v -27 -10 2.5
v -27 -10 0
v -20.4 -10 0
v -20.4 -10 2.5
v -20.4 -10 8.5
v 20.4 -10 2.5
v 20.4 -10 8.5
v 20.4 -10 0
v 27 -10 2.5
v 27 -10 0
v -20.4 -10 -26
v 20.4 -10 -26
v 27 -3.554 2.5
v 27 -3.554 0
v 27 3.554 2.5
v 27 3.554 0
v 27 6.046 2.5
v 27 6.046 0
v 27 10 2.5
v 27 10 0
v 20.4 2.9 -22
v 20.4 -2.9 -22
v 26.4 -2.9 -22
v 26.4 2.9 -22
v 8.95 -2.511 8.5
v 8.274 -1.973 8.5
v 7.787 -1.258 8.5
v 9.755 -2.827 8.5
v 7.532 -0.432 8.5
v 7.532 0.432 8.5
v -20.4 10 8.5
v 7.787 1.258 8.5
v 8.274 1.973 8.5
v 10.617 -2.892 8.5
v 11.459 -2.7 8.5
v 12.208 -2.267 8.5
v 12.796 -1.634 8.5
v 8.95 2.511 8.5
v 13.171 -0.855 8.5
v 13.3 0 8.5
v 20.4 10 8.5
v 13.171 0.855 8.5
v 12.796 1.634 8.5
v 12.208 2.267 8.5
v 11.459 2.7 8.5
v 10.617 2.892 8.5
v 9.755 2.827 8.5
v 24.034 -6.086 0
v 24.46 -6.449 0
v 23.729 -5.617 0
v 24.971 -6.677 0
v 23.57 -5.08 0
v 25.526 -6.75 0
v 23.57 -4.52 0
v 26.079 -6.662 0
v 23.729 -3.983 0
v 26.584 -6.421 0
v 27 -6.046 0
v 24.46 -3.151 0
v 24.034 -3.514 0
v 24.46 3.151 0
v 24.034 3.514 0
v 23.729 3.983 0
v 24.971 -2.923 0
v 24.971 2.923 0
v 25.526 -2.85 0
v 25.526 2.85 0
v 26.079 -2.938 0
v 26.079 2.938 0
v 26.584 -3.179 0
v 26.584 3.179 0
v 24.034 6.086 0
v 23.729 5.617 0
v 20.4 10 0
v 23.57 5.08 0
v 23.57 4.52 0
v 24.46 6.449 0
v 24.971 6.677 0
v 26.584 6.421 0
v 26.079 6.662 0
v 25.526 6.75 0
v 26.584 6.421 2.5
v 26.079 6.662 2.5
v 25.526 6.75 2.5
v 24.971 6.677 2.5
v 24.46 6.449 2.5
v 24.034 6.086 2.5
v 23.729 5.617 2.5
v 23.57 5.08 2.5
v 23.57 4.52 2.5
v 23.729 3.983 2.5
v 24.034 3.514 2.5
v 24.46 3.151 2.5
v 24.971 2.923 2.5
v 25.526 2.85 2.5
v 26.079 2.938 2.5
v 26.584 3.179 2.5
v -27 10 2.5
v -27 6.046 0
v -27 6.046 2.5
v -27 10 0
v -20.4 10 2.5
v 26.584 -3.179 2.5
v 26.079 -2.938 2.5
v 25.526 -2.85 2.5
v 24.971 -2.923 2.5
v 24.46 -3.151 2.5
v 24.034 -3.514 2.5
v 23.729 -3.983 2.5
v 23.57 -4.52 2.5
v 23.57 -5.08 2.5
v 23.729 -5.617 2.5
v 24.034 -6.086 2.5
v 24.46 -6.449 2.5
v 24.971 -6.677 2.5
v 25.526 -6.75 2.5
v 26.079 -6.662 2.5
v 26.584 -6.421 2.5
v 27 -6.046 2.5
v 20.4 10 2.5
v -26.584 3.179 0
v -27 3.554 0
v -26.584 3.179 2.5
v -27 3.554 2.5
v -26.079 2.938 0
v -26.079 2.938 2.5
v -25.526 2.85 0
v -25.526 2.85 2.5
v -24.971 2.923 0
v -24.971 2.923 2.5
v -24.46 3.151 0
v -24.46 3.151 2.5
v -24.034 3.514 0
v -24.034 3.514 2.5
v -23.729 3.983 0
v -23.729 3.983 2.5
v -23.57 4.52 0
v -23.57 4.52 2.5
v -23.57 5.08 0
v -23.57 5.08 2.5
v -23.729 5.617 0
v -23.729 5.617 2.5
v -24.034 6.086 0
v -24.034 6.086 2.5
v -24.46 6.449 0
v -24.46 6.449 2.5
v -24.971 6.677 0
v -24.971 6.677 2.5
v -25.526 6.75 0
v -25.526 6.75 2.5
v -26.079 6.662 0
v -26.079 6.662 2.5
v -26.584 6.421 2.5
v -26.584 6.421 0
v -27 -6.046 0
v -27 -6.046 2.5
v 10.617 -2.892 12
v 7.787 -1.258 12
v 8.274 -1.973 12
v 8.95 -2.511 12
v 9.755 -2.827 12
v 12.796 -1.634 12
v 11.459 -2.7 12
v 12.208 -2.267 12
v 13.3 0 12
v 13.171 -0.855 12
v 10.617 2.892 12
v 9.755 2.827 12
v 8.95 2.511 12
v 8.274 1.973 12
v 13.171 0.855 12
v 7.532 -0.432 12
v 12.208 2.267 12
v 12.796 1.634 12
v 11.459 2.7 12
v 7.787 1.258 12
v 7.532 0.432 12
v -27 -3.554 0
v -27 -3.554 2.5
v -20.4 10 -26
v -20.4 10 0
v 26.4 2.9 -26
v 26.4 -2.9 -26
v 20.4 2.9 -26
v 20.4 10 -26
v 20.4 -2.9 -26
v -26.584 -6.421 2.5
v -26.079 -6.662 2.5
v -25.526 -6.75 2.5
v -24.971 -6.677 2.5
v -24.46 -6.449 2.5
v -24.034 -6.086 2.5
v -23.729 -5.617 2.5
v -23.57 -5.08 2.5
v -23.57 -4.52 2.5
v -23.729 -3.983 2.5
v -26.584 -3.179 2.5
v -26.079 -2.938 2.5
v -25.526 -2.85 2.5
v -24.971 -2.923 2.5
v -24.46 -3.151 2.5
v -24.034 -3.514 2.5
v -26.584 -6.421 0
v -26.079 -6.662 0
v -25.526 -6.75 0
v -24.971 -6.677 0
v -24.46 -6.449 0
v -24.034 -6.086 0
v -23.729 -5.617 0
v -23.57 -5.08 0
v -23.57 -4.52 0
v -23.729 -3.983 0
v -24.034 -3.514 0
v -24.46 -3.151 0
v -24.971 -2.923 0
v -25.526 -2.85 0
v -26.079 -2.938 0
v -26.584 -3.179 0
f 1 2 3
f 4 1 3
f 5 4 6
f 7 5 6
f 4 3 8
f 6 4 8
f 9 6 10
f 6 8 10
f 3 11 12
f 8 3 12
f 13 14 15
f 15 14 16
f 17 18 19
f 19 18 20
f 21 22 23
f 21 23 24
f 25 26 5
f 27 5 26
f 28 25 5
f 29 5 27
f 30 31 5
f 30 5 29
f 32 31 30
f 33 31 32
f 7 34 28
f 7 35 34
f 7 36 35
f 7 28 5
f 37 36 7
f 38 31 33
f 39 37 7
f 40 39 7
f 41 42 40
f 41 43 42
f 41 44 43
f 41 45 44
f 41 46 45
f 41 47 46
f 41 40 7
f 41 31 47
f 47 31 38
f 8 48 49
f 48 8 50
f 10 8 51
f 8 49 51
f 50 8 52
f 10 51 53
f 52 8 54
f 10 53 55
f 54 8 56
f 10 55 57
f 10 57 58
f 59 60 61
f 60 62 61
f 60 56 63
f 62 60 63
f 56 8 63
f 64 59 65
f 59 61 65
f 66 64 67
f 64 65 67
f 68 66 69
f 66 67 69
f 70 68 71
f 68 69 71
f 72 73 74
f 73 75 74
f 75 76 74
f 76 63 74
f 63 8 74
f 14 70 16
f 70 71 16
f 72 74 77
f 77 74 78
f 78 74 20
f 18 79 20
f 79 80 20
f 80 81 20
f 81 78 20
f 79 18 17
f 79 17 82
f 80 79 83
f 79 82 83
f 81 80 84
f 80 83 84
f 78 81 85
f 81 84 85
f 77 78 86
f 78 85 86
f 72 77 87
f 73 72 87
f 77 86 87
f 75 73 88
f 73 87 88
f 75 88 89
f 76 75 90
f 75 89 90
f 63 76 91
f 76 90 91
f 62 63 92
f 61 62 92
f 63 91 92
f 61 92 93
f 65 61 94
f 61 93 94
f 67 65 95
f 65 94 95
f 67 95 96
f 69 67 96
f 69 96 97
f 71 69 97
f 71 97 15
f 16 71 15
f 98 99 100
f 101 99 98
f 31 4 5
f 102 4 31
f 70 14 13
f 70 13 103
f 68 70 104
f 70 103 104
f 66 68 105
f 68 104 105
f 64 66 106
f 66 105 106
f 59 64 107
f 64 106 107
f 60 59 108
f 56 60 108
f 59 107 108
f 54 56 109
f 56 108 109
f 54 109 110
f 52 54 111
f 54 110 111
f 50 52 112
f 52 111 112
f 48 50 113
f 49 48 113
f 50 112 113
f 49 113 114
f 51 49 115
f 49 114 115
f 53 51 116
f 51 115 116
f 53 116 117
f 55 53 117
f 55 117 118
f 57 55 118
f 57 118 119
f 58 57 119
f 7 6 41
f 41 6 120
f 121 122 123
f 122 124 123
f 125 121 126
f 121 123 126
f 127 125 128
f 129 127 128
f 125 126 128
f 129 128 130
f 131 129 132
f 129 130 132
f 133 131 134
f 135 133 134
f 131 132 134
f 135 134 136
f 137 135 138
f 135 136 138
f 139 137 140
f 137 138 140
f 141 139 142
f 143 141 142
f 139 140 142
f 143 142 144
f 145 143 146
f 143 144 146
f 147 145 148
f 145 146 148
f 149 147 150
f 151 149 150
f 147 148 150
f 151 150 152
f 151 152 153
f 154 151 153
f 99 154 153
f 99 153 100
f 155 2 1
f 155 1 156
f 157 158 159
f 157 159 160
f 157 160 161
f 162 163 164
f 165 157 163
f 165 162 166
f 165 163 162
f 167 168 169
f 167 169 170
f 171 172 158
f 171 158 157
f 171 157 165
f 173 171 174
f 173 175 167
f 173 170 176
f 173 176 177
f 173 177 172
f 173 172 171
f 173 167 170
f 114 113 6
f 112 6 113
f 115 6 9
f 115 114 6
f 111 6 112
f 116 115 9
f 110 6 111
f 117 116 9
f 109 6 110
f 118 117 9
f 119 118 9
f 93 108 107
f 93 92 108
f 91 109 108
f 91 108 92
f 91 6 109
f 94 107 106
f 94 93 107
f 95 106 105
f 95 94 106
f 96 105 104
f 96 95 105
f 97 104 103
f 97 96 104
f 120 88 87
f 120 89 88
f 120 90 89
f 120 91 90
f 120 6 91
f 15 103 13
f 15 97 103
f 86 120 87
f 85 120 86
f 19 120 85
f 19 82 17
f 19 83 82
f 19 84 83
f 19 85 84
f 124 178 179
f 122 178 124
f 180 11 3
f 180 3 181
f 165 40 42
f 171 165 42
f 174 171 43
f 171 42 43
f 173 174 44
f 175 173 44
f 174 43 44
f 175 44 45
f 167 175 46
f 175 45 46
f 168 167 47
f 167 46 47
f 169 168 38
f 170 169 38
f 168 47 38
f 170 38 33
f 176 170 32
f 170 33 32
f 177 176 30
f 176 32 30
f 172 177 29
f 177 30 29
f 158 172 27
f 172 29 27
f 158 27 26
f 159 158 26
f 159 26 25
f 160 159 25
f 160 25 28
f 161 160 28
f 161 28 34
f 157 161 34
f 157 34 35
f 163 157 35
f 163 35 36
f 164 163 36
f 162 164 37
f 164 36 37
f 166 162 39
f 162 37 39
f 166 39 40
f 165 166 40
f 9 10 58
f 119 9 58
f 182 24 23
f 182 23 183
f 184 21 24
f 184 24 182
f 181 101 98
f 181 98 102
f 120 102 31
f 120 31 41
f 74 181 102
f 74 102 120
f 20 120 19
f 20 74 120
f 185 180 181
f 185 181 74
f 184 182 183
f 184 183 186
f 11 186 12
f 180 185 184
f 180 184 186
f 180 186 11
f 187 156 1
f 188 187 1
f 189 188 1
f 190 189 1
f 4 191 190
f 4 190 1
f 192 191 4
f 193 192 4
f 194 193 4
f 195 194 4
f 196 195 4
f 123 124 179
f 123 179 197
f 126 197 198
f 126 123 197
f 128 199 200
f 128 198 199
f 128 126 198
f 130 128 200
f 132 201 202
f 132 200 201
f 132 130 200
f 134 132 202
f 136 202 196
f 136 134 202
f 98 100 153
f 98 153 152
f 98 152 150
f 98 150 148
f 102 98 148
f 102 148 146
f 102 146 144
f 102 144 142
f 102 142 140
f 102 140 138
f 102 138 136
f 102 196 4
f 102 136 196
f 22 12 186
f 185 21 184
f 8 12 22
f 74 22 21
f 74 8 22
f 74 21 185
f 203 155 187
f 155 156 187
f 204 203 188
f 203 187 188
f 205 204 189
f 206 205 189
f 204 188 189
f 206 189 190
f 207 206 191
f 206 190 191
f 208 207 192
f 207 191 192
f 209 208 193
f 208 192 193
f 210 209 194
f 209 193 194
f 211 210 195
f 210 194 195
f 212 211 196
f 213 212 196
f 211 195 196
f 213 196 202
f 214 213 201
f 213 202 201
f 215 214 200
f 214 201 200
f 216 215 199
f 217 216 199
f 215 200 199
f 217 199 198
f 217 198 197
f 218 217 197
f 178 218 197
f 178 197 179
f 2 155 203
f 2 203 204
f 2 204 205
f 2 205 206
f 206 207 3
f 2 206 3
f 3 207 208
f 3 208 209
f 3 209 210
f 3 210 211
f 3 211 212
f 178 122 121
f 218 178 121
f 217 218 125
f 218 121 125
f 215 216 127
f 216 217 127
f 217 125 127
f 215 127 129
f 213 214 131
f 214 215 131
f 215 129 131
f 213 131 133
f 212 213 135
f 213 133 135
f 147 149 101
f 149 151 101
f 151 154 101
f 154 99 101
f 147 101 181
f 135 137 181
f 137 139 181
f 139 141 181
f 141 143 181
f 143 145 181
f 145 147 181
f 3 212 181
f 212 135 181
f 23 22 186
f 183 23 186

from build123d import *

# Parameters (mm, degrees)
SKETCH1_W           = 54
SKETCH1_H           = 20
BOSS_EXTRUDE1_DEPTH = 2.5
SKETCH3_R           = 1.95
CUT_EXTRUDE1_DEPTH  = 2.5
SKETCH4_W           = 40.8
SKETCH4_H           = 20
BOSS_EXTRUDE2_DEPTH = 6
SKETCH5_W           = 40.8
SKETCH5_H           = 20
BOSS_EXTRUDE3_DEPTH = 26
SKETCH6_R           = 2.9
BOSS_EXTRUDE4_DEPTH = 3.5
SKETCH7_W           = 4
SKETCH7_H           = 5.8
BOSS_EXTRUDE5_DEPTH = 6


with BuildPart() as part:
    # Sketch1 → Boss-Extrude1 (new body)
    with BuildSketch(Plane.XY):
        Rectangle(SKETCH1_W, SKETCH1_H)
    extrude(amount=BOSS_EXTRUDE1_DEPTH)

    # Sketch3 → Cut-Extrude1 (cut)
    with BuildSketch(Plane.XY.offset(2.5)):
        with Locations((-25.5, 4.8)):
            Circle(SKETCH3_R)
        with Locations((-25.5, -4.8)):
            Circle(SKETCH3_R)
        with Locations((25.5, -4.8)):
            Circle(SKETCH3_R)
        with Locations((25.5, 4.8)):
            Circle(SKETCH3_R)
    extrude(amount=-CUT_EXTRUDE1_DEPTH, mode=Mode.SUBTRACT)

    # Sketch4 → Boss-Extrude2 (add)
    with BuildSketch(Plane.XY.offset(2.5)):
        Rectangle(SKETCH4_W, SKETCH4_H)
    extrude(amount=BOSS_EXTRUDE2_DEPTH)

    # Sketch5 → Boss-Extrude3 (add)
    with BuildSketch(Plane(origin=(0, 0, 0), x_dir=(-1, 0, 0), z_dir=(0, 0, -1))):
        Rectangle(SKETCH5_W, SKETCH5_H)
    extrude(amount=BOSS_EXTRUDE3_DEPTH)

    # Sketch6 → Boss-Extrude4 (add)
    with BuildSketch(Plane.XY.offset(8.5)):
        with Locations((10.4, 0)):
            Circle(SKETCH6_R)
    extrude(amount=BOSS_EXTRUDE4_DEPTH)

    # Sketch7 → Boss-Extrude5 (add)
    with BuildSketch(Plane(origin=(20.4, 0, 0), x_dir=(0, 0, -1), z_dir=(1, 0, 0))):
        with Locations((24, 0)):
            Rectangle(SKETCH7_W, SKETCH7_H)
    extrude(amount=BOSS_EXTRUDE5_DEPTH)


solid = part.part
